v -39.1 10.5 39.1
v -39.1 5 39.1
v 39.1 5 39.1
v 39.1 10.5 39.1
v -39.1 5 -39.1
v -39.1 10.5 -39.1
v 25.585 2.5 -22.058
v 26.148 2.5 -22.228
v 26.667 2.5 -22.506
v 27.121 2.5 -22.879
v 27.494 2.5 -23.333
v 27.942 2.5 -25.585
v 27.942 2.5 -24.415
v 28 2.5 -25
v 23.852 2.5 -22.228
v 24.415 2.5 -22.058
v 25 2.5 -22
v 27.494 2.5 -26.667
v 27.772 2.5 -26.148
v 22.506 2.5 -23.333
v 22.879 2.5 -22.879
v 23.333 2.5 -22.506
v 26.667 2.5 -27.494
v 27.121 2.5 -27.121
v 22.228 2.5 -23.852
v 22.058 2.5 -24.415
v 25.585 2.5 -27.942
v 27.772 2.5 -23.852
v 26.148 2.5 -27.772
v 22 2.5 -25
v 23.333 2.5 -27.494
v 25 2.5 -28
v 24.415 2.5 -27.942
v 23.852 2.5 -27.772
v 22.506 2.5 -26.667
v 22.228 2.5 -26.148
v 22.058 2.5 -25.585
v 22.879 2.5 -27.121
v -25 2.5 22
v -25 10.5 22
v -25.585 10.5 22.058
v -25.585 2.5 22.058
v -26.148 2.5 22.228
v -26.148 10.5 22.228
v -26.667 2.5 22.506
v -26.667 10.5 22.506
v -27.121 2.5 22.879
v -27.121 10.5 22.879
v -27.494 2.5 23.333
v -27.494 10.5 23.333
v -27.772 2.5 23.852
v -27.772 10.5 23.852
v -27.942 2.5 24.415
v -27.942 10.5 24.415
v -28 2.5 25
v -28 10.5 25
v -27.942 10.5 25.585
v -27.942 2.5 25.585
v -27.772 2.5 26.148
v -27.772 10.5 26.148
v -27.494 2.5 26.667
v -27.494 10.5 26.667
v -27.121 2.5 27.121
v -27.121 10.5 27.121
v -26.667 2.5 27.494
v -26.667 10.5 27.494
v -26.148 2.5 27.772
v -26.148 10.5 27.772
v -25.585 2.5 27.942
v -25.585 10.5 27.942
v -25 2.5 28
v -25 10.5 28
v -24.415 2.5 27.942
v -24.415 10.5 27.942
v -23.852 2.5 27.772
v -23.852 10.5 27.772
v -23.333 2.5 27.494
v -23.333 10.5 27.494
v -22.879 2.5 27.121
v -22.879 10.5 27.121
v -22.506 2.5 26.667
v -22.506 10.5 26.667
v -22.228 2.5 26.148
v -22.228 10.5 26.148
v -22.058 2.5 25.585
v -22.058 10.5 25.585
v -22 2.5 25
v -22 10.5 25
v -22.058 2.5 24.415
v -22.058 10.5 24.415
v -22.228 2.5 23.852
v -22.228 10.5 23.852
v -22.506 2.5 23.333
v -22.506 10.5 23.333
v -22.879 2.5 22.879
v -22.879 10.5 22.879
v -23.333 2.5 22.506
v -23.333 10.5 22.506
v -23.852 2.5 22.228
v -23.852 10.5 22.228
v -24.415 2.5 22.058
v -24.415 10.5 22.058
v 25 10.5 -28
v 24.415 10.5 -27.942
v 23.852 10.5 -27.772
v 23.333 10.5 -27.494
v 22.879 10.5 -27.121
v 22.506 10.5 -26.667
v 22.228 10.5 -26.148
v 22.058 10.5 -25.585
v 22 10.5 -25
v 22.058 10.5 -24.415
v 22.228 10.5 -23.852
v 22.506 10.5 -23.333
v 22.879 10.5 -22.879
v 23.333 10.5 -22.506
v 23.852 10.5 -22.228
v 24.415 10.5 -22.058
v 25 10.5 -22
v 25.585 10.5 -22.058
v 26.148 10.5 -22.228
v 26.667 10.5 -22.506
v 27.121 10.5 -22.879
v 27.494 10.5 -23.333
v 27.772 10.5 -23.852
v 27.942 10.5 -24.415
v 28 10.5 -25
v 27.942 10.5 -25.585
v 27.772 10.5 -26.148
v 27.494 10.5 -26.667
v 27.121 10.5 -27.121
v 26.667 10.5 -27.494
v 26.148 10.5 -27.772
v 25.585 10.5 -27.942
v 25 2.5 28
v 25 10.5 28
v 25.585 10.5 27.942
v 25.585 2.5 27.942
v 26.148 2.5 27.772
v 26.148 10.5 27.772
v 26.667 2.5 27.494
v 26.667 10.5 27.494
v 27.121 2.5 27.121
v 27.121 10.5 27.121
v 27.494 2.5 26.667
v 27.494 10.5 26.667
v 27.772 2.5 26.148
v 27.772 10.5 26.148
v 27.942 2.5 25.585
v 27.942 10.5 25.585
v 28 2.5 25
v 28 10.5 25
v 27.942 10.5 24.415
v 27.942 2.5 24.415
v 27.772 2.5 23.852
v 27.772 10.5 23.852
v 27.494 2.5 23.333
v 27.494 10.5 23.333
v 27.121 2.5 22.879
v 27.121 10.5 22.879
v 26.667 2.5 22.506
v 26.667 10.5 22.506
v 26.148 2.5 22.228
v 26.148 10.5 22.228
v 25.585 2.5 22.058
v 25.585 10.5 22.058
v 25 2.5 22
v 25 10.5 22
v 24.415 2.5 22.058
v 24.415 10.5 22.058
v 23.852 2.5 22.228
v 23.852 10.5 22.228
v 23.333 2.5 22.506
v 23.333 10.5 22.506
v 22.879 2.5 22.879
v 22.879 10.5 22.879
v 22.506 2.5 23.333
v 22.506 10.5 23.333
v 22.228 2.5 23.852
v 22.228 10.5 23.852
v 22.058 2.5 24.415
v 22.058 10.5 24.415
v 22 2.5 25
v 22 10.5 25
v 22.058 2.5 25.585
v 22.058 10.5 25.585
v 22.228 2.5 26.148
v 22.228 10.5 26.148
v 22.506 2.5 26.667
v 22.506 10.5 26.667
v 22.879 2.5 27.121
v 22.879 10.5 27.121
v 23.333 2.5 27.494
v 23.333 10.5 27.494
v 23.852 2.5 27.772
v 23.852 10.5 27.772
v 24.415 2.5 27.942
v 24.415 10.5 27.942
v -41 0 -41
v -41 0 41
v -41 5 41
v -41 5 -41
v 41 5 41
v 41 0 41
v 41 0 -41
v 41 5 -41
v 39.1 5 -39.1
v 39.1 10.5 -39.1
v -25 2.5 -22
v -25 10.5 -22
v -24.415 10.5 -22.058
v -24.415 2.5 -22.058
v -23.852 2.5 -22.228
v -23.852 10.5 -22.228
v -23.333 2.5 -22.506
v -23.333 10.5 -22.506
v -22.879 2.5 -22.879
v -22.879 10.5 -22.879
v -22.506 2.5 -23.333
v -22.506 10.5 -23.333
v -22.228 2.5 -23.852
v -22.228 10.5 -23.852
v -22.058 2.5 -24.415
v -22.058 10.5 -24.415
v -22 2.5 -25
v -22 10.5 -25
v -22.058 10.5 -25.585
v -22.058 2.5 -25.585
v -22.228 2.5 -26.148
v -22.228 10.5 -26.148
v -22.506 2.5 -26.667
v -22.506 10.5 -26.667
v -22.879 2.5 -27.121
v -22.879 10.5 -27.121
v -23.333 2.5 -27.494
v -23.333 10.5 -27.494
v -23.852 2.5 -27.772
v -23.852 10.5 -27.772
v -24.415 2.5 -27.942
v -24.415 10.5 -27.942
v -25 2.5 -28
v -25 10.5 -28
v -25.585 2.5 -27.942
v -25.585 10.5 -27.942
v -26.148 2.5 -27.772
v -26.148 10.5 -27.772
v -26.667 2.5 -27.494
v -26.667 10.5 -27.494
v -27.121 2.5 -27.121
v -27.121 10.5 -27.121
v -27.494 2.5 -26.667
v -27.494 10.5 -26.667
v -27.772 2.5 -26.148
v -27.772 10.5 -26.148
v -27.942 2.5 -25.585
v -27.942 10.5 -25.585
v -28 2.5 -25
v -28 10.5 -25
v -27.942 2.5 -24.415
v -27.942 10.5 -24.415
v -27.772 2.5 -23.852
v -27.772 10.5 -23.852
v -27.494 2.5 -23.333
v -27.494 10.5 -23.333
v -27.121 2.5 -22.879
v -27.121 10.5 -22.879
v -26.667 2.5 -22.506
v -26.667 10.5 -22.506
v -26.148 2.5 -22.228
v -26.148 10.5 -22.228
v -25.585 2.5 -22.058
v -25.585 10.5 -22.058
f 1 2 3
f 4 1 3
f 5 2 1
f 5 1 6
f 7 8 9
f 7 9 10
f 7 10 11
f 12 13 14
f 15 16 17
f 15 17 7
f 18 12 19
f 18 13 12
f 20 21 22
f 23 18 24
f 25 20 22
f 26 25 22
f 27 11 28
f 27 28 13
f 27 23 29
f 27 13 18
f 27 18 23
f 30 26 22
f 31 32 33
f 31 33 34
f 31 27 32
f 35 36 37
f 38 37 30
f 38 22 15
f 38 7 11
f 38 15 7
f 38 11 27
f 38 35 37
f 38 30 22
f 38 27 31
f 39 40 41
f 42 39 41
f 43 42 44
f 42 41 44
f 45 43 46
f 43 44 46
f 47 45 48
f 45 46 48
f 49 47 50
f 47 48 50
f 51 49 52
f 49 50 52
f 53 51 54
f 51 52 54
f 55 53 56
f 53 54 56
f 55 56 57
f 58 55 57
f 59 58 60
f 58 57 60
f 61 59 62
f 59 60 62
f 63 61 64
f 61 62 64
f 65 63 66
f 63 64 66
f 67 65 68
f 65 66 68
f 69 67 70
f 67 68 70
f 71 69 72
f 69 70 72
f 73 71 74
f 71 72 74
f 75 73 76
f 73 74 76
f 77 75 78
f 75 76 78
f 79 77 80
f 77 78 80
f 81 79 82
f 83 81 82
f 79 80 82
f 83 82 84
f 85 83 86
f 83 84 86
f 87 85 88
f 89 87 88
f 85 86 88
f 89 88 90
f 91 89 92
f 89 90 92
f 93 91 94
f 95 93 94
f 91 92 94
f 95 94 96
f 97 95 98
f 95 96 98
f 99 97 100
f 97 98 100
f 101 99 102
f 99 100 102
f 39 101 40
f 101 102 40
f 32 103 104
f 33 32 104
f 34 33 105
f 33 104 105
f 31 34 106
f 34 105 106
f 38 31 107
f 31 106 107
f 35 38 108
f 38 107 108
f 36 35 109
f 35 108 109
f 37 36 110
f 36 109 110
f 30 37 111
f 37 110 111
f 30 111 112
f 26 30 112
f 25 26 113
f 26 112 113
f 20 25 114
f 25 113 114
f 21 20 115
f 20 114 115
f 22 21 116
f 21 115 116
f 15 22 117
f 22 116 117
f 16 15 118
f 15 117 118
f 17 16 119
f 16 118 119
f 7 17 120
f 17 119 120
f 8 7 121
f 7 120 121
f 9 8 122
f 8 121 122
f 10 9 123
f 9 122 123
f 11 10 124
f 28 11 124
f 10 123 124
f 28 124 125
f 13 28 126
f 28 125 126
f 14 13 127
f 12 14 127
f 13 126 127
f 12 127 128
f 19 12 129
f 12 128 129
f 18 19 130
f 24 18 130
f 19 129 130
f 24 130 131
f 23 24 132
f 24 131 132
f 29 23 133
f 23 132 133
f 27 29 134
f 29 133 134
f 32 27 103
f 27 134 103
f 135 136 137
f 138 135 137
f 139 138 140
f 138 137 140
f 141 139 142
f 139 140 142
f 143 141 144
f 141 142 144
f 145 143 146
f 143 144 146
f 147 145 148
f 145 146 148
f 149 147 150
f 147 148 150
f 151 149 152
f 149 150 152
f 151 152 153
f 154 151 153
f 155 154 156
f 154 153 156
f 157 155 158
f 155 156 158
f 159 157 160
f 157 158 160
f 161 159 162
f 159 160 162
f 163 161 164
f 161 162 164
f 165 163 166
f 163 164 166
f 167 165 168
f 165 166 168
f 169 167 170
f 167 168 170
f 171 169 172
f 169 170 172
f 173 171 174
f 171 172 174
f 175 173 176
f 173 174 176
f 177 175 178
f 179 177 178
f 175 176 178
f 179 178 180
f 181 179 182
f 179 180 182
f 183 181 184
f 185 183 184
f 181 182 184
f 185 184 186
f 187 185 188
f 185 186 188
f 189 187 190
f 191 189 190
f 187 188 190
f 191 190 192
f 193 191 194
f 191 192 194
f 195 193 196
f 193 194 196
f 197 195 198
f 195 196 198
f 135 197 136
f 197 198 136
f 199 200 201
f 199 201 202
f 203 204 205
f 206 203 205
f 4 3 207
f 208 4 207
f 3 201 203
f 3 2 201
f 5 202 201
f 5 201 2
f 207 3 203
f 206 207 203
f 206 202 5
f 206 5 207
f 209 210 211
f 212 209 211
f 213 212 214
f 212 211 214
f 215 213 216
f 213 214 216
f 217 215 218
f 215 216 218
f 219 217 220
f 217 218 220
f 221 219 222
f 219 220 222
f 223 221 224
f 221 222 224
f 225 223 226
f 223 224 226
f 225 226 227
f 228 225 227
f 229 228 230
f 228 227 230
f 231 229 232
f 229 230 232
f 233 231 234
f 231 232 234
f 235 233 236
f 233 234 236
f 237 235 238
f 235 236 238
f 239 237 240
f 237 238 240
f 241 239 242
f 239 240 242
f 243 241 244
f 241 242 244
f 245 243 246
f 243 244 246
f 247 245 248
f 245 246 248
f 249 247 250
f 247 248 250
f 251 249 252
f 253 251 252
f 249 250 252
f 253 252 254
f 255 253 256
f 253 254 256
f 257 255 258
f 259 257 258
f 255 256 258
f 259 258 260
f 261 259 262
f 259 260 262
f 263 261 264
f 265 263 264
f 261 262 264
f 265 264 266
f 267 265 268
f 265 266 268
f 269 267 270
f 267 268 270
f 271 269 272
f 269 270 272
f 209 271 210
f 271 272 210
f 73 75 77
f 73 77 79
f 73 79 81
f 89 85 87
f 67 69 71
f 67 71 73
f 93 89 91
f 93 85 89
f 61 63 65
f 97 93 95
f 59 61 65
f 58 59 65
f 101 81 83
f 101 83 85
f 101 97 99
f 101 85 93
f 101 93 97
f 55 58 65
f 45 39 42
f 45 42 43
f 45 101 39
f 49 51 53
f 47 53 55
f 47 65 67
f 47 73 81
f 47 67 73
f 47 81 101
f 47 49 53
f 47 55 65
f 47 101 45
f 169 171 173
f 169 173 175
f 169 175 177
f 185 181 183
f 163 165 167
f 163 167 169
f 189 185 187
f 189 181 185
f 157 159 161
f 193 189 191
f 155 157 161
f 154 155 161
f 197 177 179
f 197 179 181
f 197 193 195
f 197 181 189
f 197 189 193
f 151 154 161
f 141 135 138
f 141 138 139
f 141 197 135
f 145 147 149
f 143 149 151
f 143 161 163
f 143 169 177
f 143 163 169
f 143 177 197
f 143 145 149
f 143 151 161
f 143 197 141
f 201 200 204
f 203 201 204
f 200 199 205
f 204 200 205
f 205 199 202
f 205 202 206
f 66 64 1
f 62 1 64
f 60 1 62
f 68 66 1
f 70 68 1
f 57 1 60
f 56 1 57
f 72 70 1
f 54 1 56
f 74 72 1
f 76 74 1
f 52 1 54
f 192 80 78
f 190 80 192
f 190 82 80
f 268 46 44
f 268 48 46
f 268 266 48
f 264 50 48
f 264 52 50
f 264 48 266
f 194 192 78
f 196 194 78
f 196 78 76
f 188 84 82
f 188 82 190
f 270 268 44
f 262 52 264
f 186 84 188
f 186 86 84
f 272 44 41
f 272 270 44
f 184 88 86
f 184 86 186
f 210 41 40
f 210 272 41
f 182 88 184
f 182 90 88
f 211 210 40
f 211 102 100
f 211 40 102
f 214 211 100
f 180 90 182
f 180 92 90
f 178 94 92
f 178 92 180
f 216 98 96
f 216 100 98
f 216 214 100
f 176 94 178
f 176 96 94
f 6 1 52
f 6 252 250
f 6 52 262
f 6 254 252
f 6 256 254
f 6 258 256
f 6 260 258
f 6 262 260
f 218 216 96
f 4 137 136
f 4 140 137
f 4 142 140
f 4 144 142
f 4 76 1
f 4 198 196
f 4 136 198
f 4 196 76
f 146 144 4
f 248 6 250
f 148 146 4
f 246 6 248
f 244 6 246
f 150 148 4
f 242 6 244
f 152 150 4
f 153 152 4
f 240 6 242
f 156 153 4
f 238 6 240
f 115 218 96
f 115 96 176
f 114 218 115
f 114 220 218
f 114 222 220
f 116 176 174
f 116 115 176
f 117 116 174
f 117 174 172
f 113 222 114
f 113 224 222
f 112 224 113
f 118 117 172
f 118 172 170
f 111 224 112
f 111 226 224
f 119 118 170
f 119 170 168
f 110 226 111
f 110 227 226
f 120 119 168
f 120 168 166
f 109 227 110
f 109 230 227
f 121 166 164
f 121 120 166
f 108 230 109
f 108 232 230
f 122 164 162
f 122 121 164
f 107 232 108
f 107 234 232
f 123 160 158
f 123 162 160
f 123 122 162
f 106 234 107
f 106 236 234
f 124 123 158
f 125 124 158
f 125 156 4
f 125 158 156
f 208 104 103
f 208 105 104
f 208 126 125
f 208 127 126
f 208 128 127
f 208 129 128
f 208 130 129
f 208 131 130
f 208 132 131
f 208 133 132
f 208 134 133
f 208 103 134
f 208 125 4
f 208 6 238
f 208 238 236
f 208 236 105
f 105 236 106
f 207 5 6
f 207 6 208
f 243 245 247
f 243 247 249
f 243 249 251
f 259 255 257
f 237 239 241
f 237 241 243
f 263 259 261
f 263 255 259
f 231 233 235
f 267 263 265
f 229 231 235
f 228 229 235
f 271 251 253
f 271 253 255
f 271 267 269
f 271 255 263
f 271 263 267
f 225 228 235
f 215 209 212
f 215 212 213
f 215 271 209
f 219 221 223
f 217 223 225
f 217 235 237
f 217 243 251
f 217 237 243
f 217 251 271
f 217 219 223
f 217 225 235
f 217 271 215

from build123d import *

# Parameters (mm, degrees)
SKETCH1_W           = 82
SKETCH1_H           = 82
BOSS_EXTRUDE1_DEPTH = 5
SKETCH2_W           = 78.2
SKETCH2_H           = 78.2
BOSS_EXTRUDE2_DEPTH = 5.5
SKETCH3_R           = 3
CUT_EXTRUDE1_DEPTH  = 8


with BuildPart() as part:
    # Sketch1 → Boss-Extrude1 (new body)
    with BuildSketch(Plane(origin=(0, 0, 0), x_dir=(1, 0, 0), z_dir=(0, 1, 0))):
        Rectangle(SKETCH1_W, SKETCH1_H)
    extrude(amount=BOSS_EXTRUDE1_DEPTH)

    # Sketch2 → Boss-Extrude2 (add)
    with BuildSketch(Plane(origin=(0, 5, 0), x_dir=(1, 0, 0), z_dir=(0, 1, 0))):
        Rectangle(SKETCH2_W, SKETCH2_H)
    extrude(amount=BOSS_EXTRUDE2_DEPTH)

    # Sketch3 → Cut-Extrude1 (cut)
    with BuildSketch(Plane(origin=(0, 10.5, 0), x_dir=(1, 0, 0), z_dir=(0, 1, 0))):
        with Locations(Location((-25, 25, 0), (0, 0, 270))):
            Circle(SKETCH3_R)
        with Locations(Location((-25, -25, 0), (0, 0, 90))):
            Circle(SKETCH3_R)
        with Locations(Location((25, -25, 0), (0, 0, 270))):
            Circle(SKETCH3_R)
        with Locations(Location((25, 25, 0), (0, 0, 90))):
            Circle(SKETCH3_R)
    extrude(amount=-CUT_EXTRUDE1_DEPTH, mode=Mode.SUBTRACT)


solid = part.part
